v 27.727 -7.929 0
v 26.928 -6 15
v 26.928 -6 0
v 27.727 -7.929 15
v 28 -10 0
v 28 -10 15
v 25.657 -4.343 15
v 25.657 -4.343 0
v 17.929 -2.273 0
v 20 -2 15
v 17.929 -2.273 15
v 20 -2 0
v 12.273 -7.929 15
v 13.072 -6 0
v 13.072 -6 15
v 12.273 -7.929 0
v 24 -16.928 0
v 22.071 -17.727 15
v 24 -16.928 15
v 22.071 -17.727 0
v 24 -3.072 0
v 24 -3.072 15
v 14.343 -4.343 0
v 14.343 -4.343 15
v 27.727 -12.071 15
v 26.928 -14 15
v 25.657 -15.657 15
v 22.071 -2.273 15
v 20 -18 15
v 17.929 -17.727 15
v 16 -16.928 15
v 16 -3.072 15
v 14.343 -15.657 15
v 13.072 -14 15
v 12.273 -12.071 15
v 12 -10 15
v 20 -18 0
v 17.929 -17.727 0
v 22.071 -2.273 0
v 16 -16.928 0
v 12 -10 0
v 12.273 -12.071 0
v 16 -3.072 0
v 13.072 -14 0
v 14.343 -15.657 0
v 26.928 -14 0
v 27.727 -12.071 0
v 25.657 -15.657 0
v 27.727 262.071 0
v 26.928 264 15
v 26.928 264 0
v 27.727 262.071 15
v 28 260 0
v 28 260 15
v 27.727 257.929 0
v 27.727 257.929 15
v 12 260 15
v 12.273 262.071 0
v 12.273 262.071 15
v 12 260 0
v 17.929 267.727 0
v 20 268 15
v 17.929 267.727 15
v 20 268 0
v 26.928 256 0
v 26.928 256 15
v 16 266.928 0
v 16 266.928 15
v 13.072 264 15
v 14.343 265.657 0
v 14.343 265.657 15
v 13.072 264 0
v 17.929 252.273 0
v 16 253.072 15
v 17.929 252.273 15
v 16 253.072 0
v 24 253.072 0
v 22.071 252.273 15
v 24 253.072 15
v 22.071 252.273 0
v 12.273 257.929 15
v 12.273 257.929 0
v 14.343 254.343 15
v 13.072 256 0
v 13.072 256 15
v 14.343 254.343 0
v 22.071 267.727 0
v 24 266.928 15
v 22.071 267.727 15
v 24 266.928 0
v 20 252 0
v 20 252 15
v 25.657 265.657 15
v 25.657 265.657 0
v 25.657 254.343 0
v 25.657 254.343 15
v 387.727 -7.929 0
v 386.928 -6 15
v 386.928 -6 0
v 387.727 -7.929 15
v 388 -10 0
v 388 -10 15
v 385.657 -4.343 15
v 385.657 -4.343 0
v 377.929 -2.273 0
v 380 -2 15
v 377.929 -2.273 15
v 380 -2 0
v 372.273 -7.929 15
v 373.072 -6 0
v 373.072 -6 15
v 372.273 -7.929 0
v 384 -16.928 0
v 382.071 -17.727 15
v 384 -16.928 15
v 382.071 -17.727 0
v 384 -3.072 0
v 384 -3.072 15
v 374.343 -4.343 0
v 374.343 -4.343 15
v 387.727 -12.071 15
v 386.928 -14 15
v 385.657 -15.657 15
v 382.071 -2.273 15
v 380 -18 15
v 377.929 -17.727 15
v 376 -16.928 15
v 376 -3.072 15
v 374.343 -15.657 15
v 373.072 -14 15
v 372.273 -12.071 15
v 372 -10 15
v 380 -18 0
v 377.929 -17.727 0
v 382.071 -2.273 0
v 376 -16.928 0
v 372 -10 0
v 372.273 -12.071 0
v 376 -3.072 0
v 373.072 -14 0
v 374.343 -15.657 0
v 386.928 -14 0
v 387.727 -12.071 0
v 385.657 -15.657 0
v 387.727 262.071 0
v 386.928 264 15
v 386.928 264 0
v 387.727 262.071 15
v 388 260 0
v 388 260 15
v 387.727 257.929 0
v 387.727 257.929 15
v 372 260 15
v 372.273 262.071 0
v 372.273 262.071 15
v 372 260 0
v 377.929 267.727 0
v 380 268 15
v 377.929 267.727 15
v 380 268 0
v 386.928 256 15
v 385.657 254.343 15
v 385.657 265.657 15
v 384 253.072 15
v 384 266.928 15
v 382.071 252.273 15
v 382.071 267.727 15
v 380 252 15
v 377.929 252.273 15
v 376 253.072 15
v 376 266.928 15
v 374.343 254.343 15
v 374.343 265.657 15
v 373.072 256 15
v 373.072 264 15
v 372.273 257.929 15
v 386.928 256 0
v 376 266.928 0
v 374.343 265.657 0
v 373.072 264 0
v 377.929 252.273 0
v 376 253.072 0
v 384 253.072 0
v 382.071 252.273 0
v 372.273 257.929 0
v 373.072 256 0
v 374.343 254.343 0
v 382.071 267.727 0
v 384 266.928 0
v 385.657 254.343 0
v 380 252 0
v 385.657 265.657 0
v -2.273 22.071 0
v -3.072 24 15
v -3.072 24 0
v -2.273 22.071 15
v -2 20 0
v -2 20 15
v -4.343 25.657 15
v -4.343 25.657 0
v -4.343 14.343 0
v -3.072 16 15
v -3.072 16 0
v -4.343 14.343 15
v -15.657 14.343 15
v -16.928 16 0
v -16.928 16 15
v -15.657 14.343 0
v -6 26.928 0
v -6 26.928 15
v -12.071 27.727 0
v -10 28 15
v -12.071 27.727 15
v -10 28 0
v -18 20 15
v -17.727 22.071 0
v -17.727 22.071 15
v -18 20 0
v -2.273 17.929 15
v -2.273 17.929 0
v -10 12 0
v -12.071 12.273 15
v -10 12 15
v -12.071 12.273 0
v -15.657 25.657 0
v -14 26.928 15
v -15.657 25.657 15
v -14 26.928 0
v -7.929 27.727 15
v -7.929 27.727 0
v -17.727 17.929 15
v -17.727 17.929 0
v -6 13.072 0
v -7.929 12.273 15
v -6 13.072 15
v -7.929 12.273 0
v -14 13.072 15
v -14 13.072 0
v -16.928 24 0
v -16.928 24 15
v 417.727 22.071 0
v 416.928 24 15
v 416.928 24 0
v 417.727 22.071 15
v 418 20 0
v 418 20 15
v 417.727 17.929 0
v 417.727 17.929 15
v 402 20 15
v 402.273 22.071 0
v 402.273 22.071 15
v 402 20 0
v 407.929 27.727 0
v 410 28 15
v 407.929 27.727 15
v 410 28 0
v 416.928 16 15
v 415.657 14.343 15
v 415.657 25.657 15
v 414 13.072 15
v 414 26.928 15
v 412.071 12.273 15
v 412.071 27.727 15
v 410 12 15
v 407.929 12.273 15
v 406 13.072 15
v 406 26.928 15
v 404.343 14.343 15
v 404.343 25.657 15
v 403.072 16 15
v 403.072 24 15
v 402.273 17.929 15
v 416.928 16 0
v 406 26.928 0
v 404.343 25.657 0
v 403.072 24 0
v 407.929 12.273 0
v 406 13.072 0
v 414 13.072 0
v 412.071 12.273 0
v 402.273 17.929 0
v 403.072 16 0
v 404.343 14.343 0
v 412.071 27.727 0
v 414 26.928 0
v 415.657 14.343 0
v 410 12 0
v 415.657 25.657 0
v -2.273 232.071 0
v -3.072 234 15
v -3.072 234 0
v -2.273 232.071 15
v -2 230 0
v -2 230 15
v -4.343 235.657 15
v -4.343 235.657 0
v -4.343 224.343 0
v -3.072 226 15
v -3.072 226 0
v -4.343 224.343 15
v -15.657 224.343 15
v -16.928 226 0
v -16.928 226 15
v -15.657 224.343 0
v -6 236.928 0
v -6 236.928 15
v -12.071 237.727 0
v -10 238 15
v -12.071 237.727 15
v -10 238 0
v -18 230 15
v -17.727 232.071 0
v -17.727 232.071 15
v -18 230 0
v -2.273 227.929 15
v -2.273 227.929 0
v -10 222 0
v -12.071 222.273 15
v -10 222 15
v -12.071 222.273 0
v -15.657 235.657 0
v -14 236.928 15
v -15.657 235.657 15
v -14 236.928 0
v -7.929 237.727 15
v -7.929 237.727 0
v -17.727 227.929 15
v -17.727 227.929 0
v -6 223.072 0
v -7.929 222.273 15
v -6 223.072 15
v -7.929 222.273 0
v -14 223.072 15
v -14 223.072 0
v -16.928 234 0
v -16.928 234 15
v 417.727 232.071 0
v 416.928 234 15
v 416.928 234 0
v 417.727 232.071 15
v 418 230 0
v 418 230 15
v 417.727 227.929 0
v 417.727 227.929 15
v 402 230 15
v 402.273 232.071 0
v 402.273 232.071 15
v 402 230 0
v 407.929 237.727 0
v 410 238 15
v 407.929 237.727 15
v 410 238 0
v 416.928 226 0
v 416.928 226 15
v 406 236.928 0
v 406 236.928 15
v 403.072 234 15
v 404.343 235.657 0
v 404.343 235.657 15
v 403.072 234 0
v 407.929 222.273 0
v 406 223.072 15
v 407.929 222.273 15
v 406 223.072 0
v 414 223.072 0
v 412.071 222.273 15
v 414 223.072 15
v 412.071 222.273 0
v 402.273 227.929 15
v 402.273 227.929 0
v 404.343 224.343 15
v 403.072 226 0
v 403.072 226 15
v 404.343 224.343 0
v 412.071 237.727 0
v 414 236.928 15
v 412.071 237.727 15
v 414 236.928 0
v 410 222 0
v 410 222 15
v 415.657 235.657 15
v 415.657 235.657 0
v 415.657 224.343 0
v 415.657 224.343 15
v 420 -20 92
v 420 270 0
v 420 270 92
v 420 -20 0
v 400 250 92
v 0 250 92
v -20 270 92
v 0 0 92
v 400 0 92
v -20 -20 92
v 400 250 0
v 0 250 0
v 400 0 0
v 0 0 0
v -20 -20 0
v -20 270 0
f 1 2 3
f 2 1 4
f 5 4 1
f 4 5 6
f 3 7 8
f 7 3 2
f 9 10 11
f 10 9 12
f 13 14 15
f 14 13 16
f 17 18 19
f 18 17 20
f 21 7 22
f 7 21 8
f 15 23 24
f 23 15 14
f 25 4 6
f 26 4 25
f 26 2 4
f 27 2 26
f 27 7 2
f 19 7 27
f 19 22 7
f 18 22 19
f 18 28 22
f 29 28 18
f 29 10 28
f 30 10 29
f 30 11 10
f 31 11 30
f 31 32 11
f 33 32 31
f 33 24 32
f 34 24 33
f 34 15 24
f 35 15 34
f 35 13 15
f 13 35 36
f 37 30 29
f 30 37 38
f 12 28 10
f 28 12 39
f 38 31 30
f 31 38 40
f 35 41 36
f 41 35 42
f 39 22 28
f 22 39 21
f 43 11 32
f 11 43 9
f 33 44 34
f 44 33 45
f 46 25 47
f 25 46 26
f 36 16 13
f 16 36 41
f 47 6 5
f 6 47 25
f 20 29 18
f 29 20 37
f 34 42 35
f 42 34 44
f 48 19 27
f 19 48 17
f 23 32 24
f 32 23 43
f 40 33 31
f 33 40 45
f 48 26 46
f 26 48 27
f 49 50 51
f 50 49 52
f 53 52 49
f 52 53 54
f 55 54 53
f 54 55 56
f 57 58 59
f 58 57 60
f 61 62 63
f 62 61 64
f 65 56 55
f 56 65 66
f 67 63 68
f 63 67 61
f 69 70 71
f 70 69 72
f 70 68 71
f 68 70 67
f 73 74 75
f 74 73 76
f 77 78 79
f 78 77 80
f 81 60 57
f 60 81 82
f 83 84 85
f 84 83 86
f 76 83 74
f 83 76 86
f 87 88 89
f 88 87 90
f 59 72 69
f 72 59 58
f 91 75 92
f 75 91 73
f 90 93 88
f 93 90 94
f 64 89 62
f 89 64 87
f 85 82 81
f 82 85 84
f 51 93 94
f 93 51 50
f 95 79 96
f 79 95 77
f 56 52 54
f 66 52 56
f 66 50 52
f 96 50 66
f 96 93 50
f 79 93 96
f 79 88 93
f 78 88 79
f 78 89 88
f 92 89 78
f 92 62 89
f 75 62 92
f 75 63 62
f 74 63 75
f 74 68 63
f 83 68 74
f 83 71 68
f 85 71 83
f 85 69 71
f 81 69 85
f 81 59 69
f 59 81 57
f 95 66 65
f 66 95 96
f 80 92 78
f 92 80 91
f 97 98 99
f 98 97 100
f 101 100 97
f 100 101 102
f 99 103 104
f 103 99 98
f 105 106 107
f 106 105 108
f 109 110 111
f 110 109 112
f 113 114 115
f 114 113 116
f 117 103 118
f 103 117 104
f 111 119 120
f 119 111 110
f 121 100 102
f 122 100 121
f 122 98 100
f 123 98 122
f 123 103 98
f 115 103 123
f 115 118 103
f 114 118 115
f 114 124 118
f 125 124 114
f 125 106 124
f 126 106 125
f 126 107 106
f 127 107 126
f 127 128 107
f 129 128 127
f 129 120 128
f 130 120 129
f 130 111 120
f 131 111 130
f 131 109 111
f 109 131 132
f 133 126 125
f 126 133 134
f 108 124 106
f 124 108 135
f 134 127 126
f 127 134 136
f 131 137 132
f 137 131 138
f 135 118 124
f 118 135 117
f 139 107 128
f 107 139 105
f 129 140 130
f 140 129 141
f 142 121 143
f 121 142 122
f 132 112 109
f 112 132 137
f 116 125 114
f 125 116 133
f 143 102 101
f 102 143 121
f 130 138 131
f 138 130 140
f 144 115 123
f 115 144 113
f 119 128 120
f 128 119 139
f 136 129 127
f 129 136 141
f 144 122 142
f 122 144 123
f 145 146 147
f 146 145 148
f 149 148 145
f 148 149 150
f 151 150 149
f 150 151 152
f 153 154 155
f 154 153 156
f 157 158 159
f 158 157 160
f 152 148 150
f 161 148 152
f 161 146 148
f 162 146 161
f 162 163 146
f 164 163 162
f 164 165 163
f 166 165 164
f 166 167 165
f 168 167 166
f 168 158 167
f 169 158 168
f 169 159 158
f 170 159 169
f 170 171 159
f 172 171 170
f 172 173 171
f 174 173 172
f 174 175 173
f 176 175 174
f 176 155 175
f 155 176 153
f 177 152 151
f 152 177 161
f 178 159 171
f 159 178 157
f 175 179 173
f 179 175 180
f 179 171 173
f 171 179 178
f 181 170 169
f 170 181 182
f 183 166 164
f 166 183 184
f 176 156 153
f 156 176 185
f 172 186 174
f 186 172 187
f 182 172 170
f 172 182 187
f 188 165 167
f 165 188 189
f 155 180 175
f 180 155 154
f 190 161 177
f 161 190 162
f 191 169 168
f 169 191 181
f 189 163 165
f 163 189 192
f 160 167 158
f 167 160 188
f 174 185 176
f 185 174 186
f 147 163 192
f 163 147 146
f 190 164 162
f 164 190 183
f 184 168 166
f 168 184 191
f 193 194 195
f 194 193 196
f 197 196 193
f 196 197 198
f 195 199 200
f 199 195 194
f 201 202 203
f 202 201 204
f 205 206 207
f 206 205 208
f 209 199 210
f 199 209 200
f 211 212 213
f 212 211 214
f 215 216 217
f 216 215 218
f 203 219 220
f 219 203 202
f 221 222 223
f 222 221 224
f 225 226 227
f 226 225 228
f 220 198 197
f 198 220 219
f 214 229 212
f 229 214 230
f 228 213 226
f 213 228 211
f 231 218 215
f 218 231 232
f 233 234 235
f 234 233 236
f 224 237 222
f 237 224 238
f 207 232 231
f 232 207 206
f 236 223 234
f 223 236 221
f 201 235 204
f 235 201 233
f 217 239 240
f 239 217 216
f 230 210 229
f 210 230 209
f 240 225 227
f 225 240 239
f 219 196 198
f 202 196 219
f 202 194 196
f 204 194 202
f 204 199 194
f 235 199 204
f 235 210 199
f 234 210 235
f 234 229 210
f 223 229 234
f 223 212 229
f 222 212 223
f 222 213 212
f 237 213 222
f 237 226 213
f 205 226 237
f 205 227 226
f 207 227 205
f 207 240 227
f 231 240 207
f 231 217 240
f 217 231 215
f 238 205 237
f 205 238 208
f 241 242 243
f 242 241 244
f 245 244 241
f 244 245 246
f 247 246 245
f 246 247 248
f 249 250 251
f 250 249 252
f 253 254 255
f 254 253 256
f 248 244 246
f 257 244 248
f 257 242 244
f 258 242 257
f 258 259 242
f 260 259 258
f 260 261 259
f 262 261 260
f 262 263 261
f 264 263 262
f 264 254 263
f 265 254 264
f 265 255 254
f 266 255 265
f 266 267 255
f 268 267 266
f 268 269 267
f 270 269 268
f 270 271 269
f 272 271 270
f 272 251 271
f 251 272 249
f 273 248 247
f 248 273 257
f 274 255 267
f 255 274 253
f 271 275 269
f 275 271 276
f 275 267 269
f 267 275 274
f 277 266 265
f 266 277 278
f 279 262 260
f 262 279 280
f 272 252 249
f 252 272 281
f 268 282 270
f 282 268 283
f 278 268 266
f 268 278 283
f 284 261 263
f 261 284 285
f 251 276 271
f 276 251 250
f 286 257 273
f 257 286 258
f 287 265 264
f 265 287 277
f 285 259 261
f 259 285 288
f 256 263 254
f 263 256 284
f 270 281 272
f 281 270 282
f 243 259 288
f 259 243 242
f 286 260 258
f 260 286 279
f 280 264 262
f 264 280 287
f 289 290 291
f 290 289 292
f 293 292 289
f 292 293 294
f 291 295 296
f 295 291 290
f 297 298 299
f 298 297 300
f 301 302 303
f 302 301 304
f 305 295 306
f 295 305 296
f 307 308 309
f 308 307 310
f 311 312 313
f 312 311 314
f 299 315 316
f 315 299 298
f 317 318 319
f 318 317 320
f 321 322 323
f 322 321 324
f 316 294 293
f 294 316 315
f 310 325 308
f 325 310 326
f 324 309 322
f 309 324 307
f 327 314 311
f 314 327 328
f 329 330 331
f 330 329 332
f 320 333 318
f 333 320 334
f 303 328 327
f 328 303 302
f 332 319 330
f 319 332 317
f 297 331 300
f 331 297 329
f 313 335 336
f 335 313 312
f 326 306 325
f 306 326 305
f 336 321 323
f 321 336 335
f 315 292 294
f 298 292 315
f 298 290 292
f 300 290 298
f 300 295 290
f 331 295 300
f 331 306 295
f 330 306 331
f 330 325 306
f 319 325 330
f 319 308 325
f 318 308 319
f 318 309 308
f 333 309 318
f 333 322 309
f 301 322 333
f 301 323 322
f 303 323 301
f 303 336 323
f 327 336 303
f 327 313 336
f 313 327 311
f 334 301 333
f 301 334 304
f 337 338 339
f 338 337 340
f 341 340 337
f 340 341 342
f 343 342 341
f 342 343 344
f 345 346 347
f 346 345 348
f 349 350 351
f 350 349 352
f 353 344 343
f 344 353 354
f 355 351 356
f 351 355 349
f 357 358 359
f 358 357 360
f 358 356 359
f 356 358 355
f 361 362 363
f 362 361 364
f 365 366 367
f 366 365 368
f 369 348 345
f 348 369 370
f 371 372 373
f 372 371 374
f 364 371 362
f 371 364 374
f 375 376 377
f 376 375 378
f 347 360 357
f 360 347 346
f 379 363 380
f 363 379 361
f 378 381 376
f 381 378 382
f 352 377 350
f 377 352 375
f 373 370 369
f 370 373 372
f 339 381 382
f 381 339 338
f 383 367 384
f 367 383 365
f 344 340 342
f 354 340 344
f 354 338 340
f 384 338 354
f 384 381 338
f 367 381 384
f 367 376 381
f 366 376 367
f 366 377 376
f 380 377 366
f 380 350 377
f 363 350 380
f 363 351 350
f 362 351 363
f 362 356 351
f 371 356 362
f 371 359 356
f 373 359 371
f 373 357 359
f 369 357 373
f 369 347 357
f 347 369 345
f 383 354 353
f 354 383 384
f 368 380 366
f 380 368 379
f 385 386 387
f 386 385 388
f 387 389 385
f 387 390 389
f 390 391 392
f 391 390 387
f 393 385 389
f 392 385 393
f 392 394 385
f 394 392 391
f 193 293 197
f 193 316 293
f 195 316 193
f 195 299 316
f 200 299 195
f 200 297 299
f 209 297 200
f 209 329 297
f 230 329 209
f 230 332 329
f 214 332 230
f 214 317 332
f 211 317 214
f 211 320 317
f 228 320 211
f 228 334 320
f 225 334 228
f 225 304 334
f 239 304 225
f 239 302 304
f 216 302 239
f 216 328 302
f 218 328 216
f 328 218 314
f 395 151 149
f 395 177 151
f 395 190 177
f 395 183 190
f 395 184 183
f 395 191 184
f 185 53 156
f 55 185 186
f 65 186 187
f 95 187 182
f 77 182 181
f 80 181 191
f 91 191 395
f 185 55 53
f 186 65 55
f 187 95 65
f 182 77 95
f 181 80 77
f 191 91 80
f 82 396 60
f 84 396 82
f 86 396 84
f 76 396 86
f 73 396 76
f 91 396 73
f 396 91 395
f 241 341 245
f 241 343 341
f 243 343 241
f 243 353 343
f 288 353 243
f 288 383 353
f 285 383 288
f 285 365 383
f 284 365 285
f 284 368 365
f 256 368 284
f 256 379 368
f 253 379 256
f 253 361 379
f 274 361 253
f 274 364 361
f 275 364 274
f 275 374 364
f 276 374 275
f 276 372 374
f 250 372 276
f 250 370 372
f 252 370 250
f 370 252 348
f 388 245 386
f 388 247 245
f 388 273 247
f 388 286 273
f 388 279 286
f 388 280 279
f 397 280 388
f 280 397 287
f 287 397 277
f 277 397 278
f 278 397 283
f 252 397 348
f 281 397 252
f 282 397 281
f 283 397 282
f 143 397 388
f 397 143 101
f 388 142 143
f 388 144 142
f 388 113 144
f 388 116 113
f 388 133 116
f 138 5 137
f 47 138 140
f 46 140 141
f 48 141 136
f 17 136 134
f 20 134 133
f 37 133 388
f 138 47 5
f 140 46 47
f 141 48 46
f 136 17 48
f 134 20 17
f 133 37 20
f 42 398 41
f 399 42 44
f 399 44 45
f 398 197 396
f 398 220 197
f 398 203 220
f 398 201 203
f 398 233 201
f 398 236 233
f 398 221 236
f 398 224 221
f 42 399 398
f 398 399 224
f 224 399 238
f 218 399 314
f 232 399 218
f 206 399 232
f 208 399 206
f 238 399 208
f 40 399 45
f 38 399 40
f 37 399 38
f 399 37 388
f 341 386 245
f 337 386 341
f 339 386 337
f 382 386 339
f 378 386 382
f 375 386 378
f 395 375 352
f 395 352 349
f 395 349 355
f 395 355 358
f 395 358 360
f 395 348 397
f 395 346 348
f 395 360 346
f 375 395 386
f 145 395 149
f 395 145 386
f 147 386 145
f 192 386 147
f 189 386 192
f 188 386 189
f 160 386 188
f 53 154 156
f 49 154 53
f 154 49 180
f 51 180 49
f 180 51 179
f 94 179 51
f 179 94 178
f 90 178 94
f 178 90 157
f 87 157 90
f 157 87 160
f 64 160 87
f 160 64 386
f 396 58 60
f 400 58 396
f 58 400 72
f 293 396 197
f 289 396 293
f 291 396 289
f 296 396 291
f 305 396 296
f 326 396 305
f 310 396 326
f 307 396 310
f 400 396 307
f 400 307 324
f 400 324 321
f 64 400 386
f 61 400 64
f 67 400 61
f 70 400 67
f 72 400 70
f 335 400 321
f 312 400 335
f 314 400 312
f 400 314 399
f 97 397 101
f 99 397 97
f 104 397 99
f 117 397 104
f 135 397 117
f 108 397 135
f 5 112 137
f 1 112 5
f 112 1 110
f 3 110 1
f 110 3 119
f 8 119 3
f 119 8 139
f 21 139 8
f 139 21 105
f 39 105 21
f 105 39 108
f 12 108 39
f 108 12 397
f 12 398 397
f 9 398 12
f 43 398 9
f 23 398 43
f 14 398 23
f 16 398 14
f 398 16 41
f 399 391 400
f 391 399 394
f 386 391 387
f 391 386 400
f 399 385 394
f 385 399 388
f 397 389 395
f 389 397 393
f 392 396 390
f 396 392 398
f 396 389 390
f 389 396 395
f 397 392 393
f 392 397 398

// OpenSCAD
// file: ../params.scad
// Shared millimetre parameters. Keep in lockstep with freecad/params.py.
// Module scale: 150 kg/day wet train. Walls are CPVC sheet, not metal.

$fn = 36;

WALL        = 12;     // CPVC sheet thickness
FLOOR       = 16;     // floor plate (trough sits on this)

// LEACH CSTR 1 — inside liquor box
CSTR_L      = 2000;
CSTR_W      = 1200;
CSTR_H      = 1400;   // liquid + freeboard
FREEBOARD   = 200;

// CSTR 2 weir (same vessel, +X wall)
WEIR_W      = 450;
WEIR_CREST  = CSTR_H - FREEBOARD;   // from inner floor
WEIR_SLOT_H = 80;
WEIR_LIP    = 120;    // external spout projection

// CSTR 3 floor auger — injection-molded PVC / FG
AUGER_D     = 140;    // flight OD
AUGER_SHAFT = 40;
AUGER_PITCH = 110;
AUGER_TROUGH_W = 180;
AUGER_TROUGH_H = 110;
AUGER_OFFSET_Y = 280; // trough centreline from inner -Y wall
AUGER_INCLINE  = 28;  // deg, lifts out of liquor toward +X

// mixer / nozzles (lid)
MIXER_D     = 50;
GAS_D       = 80;     // acid-gas takeoff
DROP_X      = 80;     // inner-X of shred drop slot
DROP_L      = 400;
DROP_W      = 250;
DROP_COAM   = 80;     // raised coaming around the slot

// LEACHATE PUMP / coarse strainer — −X wall, opposite the weir
PUMP_D      = 80;     // DN80
PUMP_Z      = 450;    // centreline above inner floor (submerged)
PUMP_Y      = 900;    // centreline from inner −Y (away from auger)
STRAINER_L  = 180;
STRAINER_W  = 140;
STRAINER_H  = 160;

// mezzanine feed train
MEZZ_H      = 2200;   // platform top above tank outer floor
MEZZ_L      = 1600;   // platform length in −X
MEZZ_THK    = 12;
HOPPER_L    = 700;
HOPPER_W    = 600;
HOPPER_H    = 800;
SHRED_L     = 500;
SHRED_W     = 500;
SHRED_H     = 450;
CONV_W      = 240;
CONV_H      = 120;
CONV_PLATE  = 6;      // trough plate
CONV_FLANGE = 40;
CONV_SPRING_D = 50;
CONV_SPRING_H = 80;
CONV_BOLT   = 10;     // M10 clearance
CONV_LEN    = 1800;   // default standalone length; plant instance is computed
DUST_D      = 150;    // dust-hood outlet to DUST header
AUGER_LIFT_L = 700;

// dewater belts + split (Phase A 4–6)
FDEW_L      = 1800;
FDEW_W      = 450;
FDEW_H      = 80;
FDEW_RISE   = 120;    // solids end higher so liquor runs back to weir
SDEW_L      = 1400;
SDEW_W      = 220;
SDEW_H      = 80;
SPLIT_L     = 600;
SPLIT_W     = 500;
SPLIT_H     = 400;
STUB_L      = 400;
STUB_W      = 300;
STUB_H      = 250;

// EW funnel cell
EW_L        = 600;    // along aisle (overflow direction)
EW_W        = 420;    // anode-cathode depth
EW_H        = 650;    // rectangular body
EW_FUNNEL_H = 220;
EW_VALVE_D  = 50;
EW_VALVE_L  = 60;
EW_MEM_T    = 4;      // CEM
EW_SLOT     = 10;     // membrane cassette slot
EW_PITCH    = 750;    // aisle spacing, centre to centre
AISLE_X0    = 200;
AISLE_Y     = -(EW_W + 2*WALL) - 400;
AISLE_Z     = 400;
BUND_H      = 150;
BUND_PAD    = 250;
SUMP_L      = 400;
SUMP_W      = 400;
SUMP_H      = 300;
VDF_D       = 700;
VDF_L       = 900;
PAIL_W      = 180;
HDR_D       = 80;
HDR_Z       = 1400;
PYRO_D      = 320;
PYRO_L      = 2800;

// Campus envelopes — lockstep with freecad/params.py
FARM_X=12000; FARM_Y=8000; FARM_L=12000; FARM_W=8000; FARM_H=4500;
FAB_X=12000;  FAB_Y=-6000; FAB_L=8000;   FAB_W=6000;  FAB_H=4000;
HAB_X=-8000;  HAB_Y=8000;  HAB_L=8000;   HAB_W=6000;  HAB_H=3200;
CRYO_X=-6000; CRYO_Y=-4000; CRYO_L=4000; CRYO_W=3000; CRYO_H=3000;
MFG_X=2000;   MFG_Y=9000;  MFG_L=6000;   MFG_W=4000;  MFG_H=3500;

LIFE_Z_GREY=900; LIFE_Z_UPW=1100; LIFE_Z_ETCH=1300;
LIFE_Z_O2=2800; LIFE_Z_N2=3000; LIFE_Z_CO2=3200;
LIFE_D_GREY=50; LIFE_D_UPW=40; LIFE_D_ETCH=32;
LIFE_D_GAS=25; LIFE_D_CO2=40;
// main file
// 1.4 / 2.6 Lid drop coaming + M16 bolt ring. No screen.
include <../params.scad>;
$fn = 24;

module mfg_lid_coaming() {
    difference() {
        translate([-20, -20, 0])
            cube([DROP_L + 40, DROP_W + 40, DROP_COAM + WALL]);
        translate([0, 0, -1])
            cube([DROP_L, DROP_W, DROP_COAM + WALL + 2]);
        for (x = [20, DROP_L - 20])
            for (y = [-10, DROP_W + 10])
                translate([x, y, -1]) cylinder(h=WALL + 4, d=16);
        for (y = [20, DROP_W - 20])
            for (x = [-10, DROP_L + 10])
                translate([x, y, -1]) cylinder(h=WALL + 4, d=16);
    }
}
mfg_lid_coaming();
